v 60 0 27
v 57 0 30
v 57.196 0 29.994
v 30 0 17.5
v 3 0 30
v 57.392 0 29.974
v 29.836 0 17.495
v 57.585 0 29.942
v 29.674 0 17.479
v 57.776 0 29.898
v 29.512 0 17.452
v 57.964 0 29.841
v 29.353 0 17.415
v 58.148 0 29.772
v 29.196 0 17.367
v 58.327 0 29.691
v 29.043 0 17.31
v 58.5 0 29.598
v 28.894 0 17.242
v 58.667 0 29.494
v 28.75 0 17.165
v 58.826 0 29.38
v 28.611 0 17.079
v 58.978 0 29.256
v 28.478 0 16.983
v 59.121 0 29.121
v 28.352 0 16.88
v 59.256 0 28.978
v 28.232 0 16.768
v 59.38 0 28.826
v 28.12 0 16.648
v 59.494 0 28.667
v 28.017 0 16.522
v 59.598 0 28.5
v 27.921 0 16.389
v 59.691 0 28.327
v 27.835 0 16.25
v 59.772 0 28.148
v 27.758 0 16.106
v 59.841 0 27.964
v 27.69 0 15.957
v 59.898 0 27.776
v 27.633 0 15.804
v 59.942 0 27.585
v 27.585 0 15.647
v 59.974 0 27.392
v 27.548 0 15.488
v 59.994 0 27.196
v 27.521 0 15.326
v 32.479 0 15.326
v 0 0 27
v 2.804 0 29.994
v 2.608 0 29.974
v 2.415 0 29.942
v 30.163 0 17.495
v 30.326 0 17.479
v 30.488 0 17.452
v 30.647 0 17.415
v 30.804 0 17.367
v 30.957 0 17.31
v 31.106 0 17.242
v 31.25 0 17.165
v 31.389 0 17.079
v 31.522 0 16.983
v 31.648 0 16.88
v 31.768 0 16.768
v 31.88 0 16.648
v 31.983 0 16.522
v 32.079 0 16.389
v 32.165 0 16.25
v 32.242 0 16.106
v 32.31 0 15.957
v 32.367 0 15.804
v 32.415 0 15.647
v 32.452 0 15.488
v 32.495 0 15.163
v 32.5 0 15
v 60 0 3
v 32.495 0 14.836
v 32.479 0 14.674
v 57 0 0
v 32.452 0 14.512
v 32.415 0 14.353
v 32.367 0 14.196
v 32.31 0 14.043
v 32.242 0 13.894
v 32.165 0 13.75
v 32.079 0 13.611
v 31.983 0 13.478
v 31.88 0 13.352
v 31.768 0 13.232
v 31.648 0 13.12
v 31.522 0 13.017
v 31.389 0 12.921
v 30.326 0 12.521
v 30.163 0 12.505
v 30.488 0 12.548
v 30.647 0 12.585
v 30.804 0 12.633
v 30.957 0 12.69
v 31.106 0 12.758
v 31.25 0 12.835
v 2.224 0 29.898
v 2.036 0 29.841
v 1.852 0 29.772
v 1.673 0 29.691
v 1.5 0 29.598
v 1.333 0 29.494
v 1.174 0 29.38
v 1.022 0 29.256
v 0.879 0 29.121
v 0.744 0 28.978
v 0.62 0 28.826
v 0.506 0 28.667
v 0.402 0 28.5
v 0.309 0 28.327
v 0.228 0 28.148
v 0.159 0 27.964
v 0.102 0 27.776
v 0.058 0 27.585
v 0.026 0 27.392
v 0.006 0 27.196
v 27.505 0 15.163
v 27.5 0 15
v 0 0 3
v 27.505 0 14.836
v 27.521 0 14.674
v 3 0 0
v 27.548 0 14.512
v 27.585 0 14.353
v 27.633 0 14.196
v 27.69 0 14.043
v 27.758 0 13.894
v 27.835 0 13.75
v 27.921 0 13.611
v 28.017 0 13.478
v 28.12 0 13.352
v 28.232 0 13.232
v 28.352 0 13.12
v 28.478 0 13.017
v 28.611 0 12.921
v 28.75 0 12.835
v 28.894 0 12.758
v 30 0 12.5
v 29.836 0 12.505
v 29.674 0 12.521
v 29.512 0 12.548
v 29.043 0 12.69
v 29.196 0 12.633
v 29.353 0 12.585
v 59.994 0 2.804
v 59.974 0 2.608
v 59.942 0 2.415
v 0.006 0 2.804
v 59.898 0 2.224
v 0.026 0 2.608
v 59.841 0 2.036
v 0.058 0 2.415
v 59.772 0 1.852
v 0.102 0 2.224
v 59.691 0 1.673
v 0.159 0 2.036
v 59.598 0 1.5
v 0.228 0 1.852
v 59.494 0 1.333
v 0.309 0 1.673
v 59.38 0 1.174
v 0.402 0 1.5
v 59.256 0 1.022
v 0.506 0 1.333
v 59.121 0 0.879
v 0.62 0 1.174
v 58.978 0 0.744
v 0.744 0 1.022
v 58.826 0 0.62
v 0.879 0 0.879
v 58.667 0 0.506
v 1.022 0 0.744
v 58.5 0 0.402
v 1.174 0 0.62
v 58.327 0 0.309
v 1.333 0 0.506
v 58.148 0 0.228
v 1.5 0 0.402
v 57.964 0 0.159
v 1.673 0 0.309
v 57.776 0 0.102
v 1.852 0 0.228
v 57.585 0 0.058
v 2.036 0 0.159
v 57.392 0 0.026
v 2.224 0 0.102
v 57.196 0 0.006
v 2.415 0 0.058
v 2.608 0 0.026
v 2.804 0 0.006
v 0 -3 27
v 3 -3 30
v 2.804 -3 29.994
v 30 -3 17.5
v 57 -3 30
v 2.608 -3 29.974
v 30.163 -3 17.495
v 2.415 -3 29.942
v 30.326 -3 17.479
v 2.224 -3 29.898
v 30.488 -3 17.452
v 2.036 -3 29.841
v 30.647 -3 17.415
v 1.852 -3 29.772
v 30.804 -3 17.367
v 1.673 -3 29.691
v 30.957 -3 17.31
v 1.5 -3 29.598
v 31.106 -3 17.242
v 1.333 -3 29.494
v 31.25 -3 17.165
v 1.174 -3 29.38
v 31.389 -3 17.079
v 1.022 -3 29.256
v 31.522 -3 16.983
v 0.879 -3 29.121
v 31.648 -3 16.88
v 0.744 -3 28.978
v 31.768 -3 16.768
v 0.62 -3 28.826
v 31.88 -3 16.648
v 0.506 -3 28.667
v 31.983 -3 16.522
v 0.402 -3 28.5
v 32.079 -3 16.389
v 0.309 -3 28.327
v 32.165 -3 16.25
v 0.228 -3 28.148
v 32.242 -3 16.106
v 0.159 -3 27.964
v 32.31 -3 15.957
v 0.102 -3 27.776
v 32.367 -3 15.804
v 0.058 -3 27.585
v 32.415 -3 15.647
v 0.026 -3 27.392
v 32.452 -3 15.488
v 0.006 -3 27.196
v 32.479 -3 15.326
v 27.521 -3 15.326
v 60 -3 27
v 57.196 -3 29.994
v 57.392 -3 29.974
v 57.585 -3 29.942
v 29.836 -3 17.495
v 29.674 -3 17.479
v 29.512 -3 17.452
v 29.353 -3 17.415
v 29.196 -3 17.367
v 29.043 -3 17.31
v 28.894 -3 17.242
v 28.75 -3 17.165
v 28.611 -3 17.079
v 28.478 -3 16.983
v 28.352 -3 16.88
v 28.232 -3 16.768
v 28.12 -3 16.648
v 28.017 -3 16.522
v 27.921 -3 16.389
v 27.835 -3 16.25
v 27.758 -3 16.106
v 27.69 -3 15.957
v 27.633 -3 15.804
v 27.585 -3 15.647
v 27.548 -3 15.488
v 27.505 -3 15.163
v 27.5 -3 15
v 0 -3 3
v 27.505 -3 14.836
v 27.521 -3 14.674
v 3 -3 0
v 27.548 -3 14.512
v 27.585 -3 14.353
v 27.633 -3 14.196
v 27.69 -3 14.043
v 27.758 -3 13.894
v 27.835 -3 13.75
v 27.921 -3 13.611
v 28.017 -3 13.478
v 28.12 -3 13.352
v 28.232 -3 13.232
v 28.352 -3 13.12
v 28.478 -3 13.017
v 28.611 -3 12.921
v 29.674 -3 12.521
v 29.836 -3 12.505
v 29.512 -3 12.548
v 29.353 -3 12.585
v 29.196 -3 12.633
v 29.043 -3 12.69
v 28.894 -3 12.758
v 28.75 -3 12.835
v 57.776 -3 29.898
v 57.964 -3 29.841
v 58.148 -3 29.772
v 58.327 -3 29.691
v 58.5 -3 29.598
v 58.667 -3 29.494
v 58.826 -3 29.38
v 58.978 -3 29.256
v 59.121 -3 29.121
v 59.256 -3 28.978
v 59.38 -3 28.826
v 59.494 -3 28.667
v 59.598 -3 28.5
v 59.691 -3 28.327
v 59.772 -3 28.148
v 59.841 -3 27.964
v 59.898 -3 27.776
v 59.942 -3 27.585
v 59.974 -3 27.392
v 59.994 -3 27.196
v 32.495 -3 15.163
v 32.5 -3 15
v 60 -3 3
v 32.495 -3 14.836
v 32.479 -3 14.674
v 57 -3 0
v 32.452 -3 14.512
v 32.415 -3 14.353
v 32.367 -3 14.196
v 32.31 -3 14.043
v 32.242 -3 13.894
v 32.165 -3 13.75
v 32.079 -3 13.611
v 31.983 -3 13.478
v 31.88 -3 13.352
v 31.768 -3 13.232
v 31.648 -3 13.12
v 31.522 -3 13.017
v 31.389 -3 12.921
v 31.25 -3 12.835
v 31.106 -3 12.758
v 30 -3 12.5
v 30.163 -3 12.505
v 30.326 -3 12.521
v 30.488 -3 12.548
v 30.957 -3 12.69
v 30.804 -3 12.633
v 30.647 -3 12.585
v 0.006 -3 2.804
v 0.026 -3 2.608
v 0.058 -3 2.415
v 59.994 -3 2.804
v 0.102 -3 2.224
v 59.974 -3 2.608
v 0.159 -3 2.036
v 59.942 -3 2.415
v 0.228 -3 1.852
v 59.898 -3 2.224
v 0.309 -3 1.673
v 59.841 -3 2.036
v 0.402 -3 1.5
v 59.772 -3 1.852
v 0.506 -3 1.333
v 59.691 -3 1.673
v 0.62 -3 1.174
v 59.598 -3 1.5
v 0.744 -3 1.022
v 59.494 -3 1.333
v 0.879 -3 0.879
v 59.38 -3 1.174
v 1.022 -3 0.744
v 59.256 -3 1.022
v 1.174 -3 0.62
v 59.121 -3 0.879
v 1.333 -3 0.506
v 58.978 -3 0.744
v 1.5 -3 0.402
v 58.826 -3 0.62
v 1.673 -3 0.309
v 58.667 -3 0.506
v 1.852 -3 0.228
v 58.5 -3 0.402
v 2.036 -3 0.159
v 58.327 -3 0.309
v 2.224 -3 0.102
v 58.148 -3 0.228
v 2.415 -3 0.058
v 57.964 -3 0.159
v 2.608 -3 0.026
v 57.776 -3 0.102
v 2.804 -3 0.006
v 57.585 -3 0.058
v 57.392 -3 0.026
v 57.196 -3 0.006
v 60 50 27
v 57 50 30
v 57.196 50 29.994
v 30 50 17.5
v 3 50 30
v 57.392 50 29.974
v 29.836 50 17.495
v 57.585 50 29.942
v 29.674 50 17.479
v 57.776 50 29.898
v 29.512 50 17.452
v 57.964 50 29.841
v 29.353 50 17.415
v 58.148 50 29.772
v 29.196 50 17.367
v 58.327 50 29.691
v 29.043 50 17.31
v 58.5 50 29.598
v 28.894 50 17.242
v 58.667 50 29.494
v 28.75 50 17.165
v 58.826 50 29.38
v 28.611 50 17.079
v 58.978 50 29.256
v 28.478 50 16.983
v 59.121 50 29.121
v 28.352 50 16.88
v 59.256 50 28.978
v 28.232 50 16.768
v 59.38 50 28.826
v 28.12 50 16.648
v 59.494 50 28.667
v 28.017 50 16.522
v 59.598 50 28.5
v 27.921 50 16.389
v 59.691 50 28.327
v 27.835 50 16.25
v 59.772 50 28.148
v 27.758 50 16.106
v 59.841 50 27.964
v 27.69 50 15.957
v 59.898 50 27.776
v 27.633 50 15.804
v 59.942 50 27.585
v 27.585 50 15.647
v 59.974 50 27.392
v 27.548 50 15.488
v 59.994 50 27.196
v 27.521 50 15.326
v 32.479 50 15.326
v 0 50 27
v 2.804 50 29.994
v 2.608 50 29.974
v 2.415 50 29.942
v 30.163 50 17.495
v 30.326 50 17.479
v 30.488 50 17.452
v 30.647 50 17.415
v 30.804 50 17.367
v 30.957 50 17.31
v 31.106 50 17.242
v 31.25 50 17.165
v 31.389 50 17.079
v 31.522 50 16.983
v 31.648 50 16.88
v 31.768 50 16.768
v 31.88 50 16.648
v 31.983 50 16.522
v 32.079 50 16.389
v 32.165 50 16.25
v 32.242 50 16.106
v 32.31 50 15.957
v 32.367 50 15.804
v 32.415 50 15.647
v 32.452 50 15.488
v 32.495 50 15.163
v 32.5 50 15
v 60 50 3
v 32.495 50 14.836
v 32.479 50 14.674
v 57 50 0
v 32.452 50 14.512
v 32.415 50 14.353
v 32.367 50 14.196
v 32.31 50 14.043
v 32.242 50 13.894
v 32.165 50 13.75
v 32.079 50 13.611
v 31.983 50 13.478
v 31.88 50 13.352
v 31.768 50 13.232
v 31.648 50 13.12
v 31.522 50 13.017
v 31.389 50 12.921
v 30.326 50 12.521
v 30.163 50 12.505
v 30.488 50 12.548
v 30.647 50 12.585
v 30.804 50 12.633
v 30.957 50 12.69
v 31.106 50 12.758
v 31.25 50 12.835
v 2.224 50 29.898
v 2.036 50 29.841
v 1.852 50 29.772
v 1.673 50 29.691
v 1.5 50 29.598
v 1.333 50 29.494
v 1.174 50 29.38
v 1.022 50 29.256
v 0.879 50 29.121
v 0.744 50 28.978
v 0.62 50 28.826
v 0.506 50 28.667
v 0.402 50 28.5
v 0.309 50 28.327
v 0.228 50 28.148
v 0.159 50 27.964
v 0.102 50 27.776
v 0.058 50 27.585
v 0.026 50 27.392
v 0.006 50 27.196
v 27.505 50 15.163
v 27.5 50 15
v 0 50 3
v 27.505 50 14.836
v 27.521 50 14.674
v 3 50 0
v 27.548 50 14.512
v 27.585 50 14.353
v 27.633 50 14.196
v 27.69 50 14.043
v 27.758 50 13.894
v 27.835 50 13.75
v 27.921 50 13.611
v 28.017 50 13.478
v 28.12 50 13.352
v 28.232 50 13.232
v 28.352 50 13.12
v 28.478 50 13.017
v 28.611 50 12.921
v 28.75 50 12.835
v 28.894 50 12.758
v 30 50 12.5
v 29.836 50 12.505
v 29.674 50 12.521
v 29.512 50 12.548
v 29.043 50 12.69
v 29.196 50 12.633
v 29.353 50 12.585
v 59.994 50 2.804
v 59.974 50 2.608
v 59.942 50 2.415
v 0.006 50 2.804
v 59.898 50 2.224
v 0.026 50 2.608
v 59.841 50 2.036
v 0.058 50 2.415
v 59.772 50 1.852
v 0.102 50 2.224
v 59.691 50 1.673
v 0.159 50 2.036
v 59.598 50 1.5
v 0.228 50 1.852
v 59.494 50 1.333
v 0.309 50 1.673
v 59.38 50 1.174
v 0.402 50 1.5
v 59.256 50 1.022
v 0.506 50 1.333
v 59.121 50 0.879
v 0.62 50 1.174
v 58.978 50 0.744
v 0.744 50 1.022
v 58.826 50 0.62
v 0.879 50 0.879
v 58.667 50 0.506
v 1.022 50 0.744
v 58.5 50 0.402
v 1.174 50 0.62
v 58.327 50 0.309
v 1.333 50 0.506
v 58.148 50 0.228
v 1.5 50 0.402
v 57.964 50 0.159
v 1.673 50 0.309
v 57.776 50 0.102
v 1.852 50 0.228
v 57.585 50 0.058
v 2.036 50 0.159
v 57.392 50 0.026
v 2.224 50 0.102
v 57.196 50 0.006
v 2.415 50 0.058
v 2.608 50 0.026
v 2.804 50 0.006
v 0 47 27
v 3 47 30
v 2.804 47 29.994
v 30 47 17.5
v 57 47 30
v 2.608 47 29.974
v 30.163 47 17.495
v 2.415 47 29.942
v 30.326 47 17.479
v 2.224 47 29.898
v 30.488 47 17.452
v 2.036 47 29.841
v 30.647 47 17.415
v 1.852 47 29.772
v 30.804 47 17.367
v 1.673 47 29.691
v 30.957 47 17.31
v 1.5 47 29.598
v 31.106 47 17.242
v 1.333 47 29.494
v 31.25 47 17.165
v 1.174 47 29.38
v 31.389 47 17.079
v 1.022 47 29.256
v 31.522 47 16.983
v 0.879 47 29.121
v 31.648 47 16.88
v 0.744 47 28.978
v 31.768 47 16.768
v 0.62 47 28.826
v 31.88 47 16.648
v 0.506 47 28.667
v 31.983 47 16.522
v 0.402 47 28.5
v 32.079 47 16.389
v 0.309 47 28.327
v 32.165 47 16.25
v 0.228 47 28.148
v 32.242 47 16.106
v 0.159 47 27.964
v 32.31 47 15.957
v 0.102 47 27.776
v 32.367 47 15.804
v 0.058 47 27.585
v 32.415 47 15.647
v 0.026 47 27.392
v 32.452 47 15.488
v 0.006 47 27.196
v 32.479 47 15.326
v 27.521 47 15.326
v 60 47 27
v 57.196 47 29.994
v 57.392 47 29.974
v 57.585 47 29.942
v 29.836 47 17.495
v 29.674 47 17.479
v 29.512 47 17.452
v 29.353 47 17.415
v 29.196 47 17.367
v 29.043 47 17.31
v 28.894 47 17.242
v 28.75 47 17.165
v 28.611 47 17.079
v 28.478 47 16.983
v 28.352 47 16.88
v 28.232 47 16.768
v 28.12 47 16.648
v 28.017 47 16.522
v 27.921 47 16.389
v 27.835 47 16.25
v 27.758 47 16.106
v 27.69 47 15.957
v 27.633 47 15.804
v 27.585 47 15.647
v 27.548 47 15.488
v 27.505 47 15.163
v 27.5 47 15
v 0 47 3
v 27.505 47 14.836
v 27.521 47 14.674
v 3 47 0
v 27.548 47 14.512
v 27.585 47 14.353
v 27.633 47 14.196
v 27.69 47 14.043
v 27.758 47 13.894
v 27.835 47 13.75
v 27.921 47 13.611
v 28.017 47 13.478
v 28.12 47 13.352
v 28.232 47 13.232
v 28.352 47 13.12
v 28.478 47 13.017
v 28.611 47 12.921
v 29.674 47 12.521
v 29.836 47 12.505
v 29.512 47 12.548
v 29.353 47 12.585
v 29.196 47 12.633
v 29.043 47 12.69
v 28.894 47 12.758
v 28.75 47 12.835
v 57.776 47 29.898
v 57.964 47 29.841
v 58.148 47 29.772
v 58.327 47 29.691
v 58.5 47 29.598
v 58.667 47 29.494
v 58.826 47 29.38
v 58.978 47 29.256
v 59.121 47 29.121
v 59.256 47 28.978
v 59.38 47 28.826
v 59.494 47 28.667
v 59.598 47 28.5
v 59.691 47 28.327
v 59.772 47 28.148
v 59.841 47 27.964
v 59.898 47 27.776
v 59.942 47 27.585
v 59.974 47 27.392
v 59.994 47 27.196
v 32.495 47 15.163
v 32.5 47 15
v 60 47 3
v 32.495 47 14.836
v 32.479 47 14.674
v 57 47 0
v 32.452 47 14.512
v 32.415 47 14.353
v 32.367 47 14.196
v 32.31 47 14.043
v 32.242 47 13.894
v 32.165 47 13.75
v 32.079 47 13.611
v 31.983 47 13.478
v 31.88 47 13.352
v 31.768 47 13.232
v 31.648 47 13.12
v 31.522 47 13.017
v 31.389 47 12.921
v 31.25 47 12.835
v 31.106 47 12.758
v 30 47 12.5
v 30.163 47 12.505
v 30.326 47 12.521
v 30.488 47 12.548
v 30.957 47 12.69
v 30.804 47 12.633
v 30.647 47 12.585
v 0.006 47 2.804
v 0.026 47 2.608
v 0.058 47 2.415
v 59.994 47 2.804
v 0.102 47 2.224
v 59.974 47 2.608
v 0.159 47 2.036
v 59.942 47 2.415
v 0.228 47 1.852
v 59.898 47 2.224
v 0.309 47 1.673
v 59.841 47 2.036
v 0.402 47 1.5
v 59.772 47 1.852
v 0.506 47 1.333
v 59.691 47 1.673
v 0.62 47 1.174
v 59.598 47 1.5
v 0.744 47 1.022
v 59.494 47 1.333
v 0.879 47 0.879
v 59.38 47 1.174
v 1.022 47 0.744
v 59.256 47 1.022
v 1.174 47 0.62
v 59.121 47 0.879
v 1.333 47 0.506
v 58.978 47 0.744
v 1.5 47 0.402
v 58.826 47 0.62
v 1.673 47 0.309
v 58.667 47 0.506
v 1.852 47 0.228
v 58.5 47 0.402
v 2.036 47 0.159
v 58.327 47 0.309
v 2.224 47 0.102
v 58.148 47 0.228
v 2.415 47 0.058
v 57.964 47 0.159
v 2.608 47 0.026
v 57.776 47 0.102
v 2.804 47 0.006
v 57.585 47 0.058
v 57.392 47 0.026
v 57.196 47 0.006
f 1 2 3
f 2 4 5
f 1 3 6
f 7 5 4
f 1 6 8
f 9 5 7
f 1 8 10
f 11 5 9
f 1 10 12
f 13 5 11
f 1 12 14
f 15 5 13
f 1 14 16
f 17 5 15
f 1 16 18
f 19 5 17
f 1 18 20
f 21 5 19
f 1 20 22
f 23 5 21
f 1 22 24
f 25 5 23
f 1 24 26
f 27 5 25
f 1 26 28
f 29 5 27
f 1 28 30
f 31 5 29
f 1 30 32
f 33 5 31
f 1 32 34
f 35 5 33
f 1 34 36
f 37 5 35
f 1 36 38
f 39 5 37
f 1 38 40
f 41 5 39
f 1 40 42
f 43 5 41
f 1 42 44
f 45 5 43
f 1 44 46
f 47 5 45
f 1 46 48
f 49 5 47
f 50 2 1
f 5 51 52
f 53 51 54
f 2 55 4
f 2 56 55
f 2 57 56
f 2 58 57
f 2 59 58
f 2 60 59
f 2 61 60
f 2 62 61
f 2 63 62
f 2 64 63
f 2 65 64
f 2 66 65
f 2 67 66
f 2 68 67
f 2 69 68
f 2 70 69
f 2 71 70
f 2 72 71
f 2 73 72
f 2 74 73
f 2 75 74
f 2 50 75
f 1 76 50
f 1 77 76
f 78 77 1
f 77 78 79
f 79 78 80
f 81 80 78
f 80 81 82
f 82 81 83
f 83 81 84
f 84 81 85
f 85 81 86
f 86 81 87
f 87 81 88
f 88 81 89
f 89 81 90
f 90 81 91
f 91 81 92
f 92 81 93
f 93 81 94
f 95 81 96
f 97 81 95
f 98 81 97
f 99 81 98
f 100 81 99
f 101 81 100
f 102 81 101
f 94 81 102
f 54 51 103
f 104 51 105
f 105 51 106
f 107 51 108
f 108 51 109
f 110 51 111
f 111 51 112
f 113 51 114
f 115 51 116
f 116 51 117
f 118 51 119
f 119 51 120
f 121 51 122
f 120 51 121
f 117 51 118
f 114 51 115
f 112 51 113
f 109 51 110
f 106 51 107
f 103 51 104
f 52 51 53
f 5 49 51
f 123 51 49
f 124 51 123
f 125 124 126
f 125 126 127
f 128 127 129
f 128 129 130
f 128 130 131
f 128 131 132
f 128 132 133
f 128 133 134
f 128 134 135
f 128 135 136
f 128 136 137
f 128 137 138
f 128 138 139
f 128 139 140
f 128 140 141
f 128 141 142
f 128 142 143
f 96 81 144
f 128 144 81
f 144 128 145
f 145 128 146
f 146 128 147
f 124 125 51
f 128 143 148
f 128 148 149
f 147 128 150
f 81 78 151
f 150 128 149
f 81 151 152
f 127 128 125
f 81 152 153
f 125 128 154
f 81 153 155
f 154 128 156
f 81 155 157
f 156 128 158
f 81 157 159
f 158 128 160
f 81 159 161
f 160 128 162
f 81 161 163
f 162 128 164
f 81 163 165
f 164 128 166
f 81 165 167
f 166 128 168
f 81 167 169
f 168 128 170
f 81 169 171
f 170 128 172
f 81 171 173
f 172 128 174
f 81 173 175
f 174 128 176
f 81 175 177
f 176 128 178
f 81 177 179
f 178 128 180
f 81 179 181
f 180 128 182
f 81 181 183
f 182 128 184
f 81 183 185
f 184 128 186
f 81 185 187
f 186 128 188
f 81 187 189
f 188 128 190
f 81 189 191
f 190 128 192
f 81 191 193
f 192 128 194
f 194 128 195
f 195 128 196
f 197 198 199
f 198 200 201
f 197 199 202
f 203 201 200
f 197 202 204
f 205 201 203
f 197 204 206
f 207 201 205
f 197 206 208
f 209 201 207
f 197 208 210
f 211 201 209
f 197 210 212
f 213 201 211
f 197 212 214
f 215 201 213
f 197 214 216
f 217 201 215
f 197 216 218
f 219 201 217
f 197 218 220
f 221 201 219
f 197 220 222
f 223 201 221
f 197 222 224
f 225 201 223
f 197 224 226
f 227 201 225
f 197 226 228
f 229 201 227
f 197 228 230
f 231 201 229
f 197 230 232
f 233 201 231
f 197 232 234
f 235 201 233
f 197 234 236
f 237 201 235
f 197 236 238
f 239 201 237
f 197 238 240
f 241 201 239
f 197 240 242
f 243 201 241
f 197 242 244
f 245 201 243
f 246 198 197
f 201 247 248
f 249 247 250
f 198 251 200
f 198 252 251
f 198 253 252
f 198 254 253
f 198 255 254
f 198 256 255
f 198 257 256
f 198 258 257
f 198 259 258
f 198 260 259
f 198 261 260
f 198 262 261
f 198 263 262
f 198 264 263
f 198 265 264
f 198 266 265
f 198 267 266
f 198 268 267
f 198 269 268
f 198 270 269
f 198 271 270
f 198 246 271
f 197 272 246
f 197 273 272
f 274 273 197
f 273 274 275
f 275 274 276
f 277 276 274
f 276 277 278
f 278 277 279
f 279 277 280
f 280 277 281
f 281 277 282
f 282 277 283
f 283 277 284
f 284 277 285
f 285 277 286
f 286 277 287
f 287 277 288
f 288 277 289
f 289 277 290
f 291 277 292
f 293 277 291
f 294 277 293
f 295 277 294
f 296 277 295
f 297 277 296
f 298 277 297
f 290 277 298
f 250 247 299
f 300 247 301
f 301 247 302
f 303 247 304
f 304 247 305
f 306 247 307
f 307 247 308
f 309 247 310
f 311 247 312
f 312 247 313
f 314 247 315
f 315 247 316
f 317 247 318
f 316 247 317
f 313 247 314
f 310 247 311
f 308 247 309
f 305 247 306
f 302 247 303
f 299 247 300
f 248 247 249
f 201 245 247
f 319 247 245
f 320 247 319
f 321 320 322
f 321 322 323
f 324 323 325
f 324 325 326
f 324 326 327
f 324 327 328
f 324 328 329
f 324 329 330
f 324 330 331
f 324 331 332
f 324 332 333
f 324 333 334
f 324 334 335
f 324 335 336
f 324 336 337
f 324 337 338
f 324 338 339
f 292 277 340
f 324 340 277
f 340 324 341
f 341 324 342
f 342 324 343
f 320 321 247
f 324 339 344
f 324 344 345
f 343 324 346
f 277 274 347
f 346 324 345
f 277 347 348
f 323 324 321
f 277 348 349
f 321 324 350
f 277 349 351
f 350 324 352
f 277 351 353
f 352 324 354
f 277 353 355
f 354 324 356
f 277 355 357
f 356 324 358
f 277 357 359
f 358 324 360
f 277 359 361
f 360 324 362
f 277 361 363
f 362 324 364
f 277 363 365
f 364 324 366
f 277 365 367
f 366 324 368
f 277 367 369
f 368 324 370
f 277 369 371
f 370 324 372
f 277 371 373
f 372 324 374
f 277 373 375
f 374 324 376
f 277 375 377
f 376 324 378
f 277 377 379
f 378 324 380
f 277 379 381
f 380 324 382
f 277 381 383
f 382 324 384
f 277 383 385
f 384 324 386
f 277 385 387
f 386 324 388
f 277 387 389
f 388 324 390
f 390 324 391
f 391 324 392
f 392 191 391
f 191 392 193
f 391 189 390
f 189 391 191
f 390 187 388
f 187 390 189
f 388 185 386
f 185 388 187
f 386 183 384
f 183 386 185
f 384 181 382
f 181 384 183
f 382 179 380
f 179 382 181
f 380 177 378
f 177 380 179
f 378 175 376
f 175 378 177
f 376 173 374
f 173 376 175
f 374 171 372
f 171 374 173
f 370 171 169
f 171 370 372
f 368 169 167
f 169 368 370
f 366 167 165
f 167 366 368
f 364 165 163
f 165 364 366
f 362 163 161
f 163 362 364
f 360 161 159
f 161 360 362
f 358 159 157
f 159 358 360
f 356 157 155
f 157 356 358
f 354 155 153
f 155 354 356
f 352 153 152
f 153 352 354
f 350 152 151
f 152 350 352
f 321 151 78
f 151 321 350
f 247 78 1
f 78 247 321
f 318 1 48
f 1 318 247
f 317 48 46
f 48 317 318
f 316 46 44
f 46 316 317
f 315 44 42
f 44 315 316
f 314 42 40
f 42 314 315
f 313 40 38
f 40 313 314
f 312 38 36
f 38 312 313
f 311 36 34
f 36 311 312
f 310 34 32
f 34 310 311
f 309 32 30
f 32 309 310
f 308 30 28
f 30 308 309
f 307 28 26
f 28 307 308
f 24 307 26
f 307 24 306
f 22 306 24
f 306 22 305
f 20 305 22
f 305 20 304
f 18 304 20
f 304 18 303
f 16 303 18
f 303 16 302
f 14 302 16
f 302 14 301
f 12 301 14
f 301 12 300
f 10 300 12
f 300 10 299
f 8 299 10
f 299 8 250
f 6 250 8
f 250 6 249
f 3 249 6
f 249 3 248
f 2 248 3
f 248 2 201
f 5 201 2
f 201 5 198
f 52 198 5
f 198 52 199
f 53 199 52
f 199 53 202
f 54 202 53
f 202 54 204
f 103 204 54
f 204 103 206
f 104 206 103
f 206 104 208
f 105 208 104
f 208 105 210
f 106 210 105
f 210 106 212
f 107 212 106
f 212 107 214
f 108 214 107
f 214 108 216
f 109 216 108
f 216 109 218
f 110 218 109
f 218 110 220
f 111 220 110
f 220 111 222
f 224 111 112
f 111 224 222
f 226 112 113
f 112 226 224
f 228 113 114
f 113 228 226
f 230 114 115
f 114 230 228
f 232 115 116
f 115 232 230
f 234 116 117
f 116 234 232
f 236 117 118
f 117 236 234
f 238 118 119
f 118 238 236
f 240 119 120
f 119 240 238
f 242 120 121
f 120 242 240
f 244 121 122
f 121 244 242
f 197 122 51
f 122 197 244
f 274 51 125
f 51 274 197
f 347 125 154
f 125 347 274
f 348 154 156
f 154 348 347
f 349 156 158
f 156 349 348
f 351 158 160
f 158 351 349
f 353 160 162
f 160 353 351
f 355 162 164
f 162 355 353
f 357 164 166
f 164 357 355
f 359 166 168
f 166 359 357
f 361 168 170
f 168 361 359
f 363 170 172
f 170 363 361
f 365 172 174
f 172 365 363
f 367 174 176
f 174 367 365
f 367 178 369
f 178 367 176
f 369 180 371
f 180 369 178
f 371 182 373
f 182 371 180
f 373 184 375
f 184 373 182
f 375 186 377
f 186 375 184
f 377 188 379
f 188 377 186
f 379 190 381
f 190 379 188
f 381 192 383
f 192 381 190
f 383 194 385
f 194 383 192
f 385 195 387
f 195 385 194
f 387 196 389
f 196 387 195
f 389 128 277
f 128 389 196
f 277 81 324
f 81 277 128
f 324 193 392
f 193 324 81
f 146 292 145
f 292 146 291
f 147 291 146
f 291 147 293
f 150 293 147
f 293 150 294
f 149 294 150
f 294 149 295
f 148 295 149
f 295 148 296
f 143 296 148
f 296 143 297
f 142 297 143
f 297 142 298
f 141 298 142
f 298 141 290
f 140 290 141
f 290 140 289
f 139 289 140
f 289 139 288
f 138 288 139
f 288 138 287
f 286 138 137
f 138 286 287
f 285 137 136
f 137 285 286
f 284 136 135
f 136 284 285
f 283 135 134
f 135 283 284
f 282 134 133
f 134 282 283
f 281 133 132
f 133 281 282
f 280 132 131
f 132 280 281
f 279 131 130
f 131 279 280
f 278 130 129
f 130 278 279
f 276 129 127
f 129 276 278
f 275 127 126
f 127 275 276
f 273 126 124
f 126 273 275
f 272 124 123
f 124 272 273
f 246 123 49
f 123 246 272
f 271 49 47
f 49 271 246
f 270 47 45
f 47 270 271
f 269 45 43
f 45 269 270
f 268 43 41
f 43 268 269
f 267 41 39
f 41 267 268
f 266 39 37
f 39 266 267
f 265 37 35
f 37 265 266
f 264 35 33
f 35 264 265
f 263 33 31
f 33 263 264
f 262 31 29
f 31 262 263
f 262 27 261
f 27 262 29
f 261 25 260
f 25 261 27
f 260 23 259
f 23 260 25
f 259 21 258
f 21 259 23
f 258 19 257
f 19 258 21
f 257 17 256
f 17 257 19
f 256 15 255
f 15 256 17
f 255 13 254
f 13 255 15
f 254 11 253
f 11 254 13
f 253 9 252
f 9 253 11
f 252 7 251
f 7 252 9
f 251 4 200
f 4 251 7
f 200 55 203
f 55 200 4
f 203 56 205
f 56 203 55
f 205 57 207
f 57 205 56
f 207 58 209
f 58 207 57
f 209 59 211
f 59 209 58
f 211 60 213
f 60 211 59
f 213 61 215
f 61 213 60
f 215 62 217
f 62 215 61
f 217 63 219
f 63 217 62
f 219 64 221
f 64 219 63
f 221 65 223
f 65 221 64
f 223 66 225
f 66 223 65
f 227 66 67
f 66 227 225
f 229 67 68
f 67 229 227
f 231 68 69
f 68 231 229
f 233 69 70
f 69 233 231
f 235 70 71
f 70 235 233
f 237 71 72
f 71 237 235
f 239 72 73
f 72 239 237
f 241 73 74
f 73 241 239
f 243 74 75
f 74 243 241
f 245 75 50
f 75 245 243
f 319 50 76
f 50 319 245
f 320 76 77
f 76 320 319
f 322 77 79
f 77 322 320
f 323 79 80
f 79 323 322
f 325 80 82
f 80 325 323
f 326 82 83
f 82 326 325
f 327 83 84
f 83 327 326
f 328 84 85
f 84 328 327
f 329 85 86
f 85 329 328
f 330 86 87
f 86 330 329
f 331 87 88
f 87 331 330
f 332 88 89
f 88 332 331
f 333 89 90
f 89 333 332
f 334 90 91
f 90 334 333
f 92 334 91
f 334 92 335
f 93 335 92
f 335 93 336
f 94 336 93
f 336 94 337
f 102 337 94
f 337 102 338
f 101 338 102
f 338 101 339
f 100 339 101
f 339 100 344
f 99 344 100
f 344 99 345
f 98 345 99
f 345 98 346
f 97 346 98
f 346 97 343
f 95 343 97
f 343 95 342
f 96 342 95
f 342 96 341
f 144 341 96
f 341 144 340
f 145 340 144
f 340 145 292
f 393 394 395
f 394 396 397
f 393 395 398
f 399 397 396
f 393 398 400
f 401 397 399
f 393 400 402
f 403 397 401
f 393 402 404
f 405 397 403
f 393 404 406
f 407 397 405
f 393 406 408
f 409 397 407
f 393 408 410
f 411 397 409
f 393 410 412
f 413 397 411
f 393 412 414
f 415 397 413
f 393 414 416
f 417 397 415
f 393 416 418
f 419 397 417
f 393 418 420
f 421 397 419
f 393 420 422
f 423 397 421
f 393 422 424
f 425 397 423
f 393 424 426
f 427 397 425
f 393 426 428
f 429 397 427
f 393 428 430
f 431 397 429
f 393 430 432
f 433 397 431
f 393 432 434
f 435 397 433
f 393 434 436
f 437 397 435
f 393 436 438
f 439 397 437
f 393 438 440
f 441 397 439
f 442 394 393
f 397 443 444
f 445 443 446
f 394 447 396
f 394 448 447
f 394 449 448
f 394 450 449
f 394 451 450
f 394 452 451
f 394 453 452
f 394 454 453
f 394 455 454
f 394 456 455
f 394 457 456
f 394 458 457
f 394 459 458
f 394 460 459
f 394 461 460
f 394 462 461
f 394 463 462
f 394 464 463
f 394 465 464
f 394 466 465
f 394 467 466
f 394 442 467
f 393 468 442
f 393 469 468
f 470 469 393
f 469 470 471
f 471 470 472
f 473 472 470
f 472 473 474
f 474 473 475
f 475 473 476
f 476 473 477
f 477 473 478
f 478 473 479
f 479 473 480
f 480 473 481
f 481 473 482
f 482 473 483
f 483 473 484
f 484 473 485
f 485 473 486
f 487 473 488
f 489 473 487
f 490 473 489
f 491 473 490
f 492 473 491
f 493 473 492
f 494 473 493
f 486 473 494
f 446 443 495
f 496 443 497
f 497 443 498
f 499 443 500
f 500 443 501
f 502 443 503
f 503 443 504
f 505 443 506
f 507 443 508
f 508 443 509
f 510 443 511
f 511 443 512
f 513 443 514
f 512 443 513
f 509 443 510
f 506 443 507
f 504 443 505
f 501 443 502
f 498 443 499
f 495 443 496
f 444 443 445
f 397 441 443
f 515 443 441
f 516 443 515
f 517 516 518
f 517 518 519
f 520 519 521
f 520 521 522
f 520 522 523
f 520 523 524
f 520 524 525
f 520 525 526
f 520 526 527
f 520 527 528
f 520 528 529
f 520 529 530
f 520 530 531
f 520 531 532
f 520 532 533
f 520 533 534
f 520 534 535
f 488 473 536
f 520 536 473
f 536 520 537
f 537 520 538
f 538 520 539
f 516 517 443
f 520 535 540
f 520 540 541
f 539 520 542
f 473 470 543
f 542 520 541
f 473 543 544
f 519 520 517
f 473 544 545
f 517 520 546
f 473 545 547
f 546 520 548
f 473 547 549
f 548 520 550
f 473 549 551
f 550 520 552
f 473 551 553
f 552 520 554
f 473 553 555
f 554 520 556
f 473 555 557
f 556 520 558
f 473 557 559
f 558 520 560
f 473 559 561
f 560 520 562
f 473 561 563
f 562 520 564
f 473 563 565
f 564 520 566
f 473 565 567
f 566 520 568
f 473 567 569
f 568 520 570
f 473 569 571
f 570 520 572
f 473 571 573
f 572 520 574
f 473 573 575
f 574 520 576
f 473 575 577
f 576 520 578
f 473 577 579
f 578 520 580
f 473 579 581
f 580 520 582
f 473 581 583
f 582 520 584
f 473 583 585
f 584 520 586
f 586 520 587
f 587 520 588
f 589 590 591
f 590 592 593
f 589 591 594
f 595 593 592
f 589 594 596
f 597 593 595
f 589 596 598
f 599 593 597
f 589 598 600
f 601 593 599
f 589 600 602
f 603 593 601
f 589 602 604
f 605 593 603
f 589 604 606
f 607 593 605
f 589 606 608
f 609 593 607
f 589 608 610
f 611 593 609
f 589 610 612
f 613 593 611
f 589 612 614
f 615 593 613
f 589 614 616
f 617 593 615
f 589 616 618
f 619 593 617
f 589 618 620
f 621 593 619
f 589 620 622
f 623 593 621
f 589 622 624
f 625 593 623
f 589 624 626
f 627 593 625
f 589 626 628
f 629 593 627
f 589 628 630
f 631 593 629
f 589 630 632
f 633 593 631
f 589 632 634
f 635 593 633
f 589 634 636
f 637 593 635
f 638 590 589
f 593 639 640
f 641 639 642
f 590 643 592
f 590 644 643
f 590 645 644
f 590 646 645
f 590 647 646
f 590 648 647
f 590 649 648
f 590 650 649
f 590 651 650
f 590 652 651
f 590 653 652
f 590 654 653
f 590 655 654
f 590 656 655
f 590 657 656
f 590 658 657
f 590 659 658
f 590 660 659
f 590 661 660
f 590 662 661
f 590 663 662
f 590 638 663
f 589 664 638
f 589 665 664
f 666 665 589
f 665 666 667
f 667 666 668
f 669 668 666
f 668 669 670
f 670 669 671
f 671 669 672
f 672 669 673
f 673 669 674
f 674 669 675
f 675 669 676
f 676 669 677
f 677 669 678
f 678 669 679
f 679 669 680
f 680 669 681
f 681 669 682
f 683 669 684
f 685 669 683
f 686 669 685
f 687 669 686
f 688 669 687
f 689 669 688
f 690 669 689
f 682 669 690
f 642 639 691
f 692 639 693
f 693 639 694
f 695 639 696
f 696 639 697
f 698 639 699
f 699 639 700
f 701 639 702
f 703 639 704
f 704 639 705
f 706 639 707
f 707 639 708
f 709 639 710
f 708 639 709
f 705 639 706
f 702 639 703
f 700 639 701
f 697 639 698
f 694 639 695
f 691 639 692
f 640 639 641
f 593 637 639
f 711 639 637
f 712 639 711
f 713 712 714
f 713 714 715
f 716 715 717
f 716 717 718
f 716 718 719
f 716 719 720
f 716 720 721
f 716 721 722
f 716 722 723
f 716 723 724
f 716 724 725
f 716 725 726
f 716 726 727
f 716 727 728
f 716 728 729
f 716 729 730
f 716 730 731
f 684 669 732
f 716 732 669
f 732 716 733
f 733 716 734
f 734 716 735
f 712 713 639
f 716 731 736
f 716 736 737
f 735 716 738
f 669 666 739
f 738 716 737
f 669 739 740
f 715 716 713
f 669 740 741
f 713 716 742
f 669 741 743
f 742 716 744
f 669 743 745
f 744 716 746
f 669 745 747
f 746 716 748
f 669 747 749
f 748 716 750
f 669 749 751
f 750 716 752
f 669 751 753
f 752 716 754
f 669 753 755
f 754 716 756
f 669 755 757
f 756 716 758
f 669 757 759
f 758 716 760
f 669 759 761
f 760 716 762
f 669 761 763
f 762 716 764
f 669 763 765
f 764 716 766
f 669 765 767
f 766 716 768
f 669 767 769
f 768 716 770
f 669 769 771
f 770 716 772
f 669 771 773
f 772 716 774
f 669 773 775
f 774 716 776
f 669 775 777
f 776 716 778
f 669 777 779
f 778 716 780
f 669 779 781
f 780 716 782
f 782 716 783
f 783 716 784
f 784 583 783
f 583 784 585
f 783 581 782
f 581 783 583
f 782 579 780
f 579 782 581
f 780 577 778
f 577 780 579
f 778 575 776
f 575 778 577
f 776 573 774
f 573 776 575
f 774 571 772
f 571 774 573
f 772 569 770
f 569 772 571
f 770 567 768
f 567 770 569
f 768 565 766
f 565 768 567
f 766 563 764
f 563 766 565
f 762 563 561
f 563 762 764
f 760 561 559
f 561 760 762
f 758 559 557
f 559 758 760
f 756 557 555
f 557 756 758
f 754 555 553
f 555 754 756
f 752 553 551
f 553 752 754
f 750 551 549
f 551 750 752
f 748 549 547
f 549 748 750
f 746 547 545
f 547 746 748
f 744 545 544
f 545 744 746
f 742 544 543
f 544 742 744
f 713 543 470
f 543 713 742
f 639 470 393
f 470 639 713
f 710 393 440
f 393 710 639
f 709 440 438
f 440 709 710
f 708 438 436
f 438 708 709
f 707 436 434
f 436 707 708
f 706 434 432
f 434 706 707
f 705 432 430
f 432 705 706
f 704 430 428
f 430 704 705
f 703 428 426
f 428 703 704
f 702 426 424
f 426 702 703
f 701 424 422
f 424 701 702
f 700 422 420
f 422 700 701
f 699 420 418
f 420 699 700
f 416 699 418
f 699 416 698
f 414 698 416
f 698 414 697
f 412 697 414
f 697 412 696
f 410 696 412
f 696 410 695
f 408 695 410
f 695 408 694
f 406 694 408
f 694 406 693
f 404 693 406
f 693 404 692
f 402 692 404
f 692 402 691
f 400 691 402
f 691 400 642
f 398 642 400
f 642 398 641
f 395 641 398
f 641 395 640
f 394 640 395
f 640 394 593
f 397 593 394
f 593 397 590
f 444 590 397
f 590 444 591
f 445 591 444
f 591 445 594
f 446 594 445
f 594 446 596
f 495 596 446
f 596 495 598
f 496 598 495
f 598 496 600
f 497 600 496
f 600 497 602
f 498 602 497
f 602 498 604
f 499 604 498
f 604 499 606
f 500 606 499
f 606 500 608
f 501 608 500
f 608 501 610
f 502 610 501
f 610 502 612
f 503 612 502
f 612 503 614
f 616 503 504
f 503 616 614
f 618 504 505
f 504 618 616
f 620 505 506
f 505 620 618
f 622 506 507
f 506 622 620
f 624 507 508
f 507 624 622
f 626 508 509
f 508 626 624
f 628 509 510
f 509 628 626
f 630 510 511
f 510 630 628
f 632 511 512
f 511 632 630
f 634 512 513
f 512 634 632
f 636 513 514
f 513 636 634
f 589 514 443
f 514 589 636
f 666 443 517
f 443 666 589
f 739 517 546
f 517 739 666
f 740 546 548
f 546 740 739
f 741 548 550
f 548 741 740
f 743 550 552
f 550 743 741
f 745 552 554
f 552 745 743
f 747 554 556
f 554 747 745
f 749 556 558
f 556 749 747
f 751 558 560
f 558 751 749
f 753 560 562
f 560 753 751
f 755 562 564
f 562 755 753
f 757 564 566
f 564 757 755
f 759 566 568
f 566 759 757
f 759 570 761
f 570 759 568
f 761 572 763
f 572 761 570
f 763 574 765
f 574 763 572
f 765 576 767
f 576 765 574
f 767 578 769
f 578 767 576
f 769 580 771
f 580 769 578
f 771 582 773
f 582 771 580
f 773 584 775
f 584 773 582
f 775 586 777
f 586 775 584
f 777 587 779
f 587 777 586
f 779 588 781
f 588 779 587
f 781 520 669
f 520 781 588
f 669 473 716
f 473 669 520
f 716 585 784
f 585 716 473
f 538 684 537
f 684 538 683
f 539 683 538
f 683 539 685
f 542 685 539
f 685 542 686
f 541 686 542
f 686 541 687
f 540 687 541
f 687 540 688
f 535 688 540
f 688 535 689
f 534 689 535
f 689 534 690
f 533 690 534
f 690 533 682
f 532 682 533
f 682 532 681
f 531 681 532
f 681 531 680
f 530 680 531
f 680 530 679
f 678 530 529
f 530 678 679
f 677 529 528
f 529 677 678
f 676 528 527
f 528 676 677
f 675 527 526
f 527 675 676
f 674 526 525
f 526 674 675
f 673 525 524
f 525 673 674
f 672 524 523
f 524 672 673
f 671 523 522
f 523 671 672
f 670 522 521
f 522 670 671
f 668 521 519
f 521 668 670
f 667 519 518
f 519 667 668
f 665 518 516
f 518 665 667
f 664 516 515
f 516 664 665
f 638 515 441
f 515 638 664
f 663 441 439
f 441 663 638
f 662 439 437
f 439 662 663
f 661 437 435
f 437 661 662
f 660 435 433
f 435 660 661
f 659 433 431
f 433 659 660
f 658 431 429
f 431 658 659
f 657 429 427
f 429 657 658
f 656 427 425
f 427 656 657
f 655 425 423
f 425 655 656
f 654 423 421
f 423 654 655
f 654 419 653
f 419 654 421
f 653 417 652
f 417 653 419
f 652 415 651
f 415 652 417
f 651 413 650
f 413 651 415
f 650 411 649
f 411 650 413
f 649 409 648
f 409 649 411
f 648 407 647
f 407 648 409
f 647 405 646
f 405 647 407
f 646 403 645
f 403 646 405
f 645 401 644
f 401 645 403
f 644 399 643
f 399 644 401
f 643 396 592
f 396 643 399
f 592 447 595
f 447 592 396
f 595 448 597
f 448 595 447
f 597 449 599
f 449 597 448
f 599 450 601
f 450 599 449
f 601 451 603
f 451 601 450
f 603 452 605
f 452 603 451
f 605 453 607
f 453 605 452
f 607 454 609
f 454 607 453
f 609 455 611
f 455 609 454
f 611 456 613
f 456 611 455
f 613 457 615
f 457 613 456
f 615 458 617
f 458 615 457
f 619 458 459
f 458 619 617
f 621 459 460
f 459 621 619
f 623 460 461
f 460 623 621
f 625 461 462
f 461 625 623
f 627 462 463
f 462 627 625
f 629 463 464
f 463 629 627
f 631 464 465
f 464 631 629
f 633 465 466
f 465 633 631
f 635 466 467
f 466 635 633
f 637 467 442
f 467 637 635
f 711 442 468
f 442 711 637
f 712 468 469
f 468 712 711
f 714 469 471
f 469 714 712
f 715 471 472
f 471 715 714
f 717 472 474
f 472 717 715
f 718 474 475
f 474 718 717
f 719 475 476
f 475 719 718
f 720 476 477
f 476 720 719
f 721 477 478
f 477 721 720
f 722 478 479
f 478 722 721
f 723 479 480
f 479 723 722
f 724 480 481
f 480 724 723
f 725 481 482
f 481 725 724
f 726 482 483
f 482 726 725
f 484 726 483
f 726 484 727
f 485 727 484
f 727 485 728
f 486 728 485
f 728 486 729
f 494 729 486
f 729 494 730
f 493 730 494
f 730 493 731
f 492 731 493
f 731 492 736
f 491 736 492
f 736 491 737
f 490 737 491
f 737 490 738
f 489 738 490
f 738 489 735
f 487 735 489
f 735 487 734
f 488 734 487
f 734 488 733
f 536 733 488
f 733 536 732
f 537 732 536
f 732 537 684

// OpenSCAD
// file: ../component/component_2d.scad
// Canonical manufacturing profile for the component template.
module tpl_component_plate_2d(size=[60, 30], hole_diameter=5,
                              corner_radius=3)
{
    assert(size[0] > 2*corner_radius && size[1] > 2*corner_radius,
           "tpl_component_plate_2d: radius consumes the plate");
    assert(hole_diameter > 0 && hole_diameter < min(size),
           "tpl_component_plate_2d: invalid hole diameter");

    difference() {
        translate([corner_radius, corner_radius])
            offset(r=corner_radius)
                square([size[0]-2*corner_radius,
                        size[1]-2*corner_radius]);
        translate(size/2)
            circle(d=hole_diameter);
    }
}
// file: ../../cutter_lib/layout/cl_cut_layout.scad
// Deterministic sheet-layout helpers. Placement remains explicit because
// OpenSCAD cannot query arbitrary child bounds reliably.

/* [Output] */
make_3d = true; // [false:true]

/* [2D Layout] */
example_sheet_size = [120, 70];
example_margin = 5;
example_spacing = 5;

/* [Example] */
example_part_size = [45, 25];
example_thickness = 3;

/* [Hidden] */

cl_cut_layout_example(
    sheet_size=example_sheet_size,
    margin=example_margin,
    spacing=example_spacing,
    part_size=example_part_size,
    thickness=example_thickness,
    make_3d=make_3d);

module cl_cut_layout_example(sheet_size=[120, 70], margin=5, spacing=5,
                             part_size=[45, 25], thickness=3,
                             make_3d=false)
{
    positions = [[margin, margin],
                 [margin+part_size[0]+spacing, margin]];
    boxes = [[positions[0][0], positions[0][1],
              part_size[0], part_size[1]],
             [positions[1][0], positions[1][1],
              part_size[0], part_size[1]]];
    cl_validate_layout(boxes, sheet_size, margin, spacing, "example sheet");

    if (!make_3d)
        cl_sheet_boundary(sheet_size, "LAYOUT EXAMPLE");

    for (p = positions)
        translate([p[0], p[1], 0])
            if (make_3d)
                linear_extrude(height=thickness)
                    square(part_size);
            else
                square(part_size);
}

function cl_boxes_overlap(a, b, spacing=0) =
    !(a[0]+a[2]+spacing <= b[0] ||
      b[0]+b[2]+spacing <= a[0] ||
      a[1]+a[3]+spacing <= b[1] ||
      b[1]+b[3]+spacing <= a[1]);

module cl_validate_layout(boxes, sheet_size=[300,300],
                          margin=5, spacing=3, name="sheet")
{
    assert(sheet_size[0] > 2*margin && sheet_size[1] > 2*margin,
           str("cl_validate_layout: invalid ", name, " dimensions/margin"));

    for (i = [0:len(boxes)-1]) {
        b = boxes[i];
        assert(b[0] >= margin && b[1] >= margin &&
               b[0]+b[2] <= sheet_size[0]-margin &&
               b[1]+b[3] <= sheet_size[1]-margin,
               str("cl_validate_layout: part ", i,
                   " is outside ", name));

        if (i < len(boxes)-1)
            for (j = [i+1:len(boxes)-1])
                assert(!cl_boxes_overlap(b, boxes[j], spacing),
                       str("cl_validate_layout: parts ", i,
                           " and ", j, " overlap on ", name));
    }
}

module cl_sheet_boundary(sheet_size=[300,300], label="",
                         line_width=0.3)
{
    assert(sheet_size[0] > 0 && sheet_size[1] > 0,
           "cl_sheet_boundary: sheet size must be positive");

    %difference() {
        square(sheet_size);
        translate([line_width, line_width])
            square([sheet_size[0]-2*line_width,
                    sheet_size[1]-2*line_width]);
    }

    if (label != "")
        %translate([2, sheet_size[1]-5])
            text(label, size=3);
}

// Place a known-size part and optionally add a preview-only identifier.
module cl_layout_part(position, size, id="", quantity=1,
                      sheet_size=[300,300], margin=5,
                      label_size=2)
{
    assert(size[0] > 0 && size[1] > 0,
           str("cl_layout_part: ", id, " has non-positive size"));
    assert(position[0] >= margin && position[1] >= margin &&
           position[0]+size[0] <= sheet_size[0]-margin &&
           position[1]+size[1] <= sheet_size[1]-margin,
           str("cl_layout_part: ", id, " does not fit the sheet"));

    translate(position)
        children();

    if (id != "")
        %translate([position[0],
                    max(0.5, position[1]-label_size-0.5)])
            text(str(id, quantity > 1 ? str(" x", quantity) : ""),
                 size=label_size);
}

// Preview conventions for separating operations. Geometry is not altered.
module cl_cut_geometry()
{
    color("red")
        children();
}

module cl_engrave_geometry()
{
    color("blue")
        children();
}

module cl_reference_geometry()
{
    %color("gray")
        children();
}

// Select a manufacturing operation explicitly. Preview mode keeps both
// operations visible with conventional colours; exported cut/engrave modes
// contain only the requested geometry.
module cl_operation_geometry(kind="cut", output="preview")
{
    assert(kind == "cut" || kind == "engrave",
           "cl_operation_geometry: kind must be cut or engrave");
    assert(output == "cut" || output == "engrave" ||
           output == "preview",
           "cl_operation_geometry: unsupported output");

    if (output == kind)
        children();
    else if (output == "preview") {
        if (kind == "cut")
            cl_cut_geometry()
                children();
        else
            cl_engrave_geometry()
                children();
    }
}
// file: ../component/component.scad
use <component_2d.scad>

/* [Output] */
make_3d = true; // [false:true]

/* [Dimensions] */
plate_size = [60, 30];
material_thickness = 3; // [0.5:0.5:12]
hole_diameter = 5;      // [1:0.5:20]
corner_radius = 3;      // [0:0.5:12]

/* [Example] */
example_color = "burlywood";

/* [Hidden] */
$fn = $preview ? 32 : 96;

tpl_component_plate(
    size=plate_size,
    thickness=material_thickness,
    hole_diameter=hole_diameter,
    corner_radius=corner_radius,
    make_3d=make_3d,
    part_color=example_color
);

// Public wrapper. The 3D branch only extrudes the canonical 2D profile.
module tpl_component_plate(size=[60, 30], thickness=3,
                           hole_diameter=5, corner_radius=3,
                           make_3d=false, part_color="burlywood")
{
    assert(thickness > 0,
           "tpl_component_plate: thickness must be positive");

    color(part_color)
        if (make_3d)
            linear_extrude(height=thickness)
                tpl_component_plate_2d(
                    size=size,
                    hole_diameter=hole_diameter,
                    corner_radius=corner_radius);
        else
            tpl_component_plate_2d(
                size=size,
                hole_diameter=hole_diameter,
                corner_radius=corner_radius);
}
// file: assembly_layout.scad
use <../../cutter_lib/layout/cl_cut_layout.scad>
use <../component/component.scad>

/* [Output] */
make_3d = false; // [false:true]

/* [2D Layout] */
sheet_size = [300, 200];
sheet_margin = 5; // [0:1:20]
part_spacing = 5; // [0:1:20]
layout_operation = "cut"; // [cut,engrave,score,reference,all]

/* [Example] */
material_thickness = 3; // [1:0.5:8]

/* [Hidden] */

tpl_assembly_layout(
    sheet_size=sheet_size,
    margin=sheet_margin,
    spacing=part_spacing,
    thickness=material_thickness,
    operation=layout_operation,
    make_3d=make_3d);

module tpl_assembly_layout(sheet_size=[300, 200], margin=5, spacing=5,
                           thickness=3, operation="cut", make_3d=false)
{
    part_size = [60, 30];
    positions = [[margin, margin],
                 [margin+part_size[0]+spacing, margin]];
    boxes = [[positions[0][0], positions[0][1], part_size[0], part_size[1]],
             [positions[1][0], positions[1][1], part_size[0], part_size[1]]];

    cl_validate_layout(boxes, sheet_size, margin, spacing,
                       "template assembly sheet");

    if (!make_3d)
        cl_sheet_boundary(sheet_size, "TEMPLATE");

    for (i = [0:1])
        translate([positions[i][0], positions[i][1], 0])
            tpl_component_plate(
                size=part_size,
                thickness=thickness,
                make_3d=make_3d,
                part_color=i == 0 ? "burlywood" : "peru");
}
// file: assembly_config.scad
/* [Output] */
make_3d = true; // [false:true]

/* [Dimensions] */
example_width = 80;             // [40:5:160]
example_depth = 50;             // [30:5:120]
example_height = 45;            // [20:5:100]
example_material_thickness = 3; // [1:0.5:8]

/* [Example] */
show_dimension_blocks = true;

/* [Hidden] */

if (show_dimension_blocks)
    tpl_config_example(
        width=example_width,
        depth=example_depth,
        height=example_height,
        thickness=example_material_thickness,
        make_3d=make_3d);

function tpl_default_size() = [80, 50, 45];
function tpl_default_thickness() = 3;
function tpl_default_sheet_size() = [300, 200];

// A configuration file still supplies a useful standalone scale example.
module tpl_config_example(width=80, depth=50, height=45, thickness=3,
                          make_3d=false)
{
    sizes = [[width, thickness], [depth, thickness], [height, thickness]];
    for (i = [0:2])
        translate([0, i*(thickness+4)])
            if (make_3d)
                linear_extrude(height=thickness)
                    square(sizes[i]);
            else
                square(sizes[i]);
}
// main file
use <assembly_config.scad>
use <assembly_layout.scad>
use <../component/component.scad>

/* [Output] */
make_3d = true; // [false:true]
output_mode = "automatic"; // [automatic,assembly,cut_layout,single_part,calibration,debug]

/* [Dimensions] */
assembly_size = [80, 50, 45];
material_thickness = 3; // [1:0.5:8]

/* [Material] */
kerf = 0.15;         // [0:0.01:1]
fit_clearance = 0.1; // [-0.5:0.05:1]

/* [2D Layout] */
sheet_size = [300, 200];
sheet_margin = 5;
part_spacing = 5;
layout_operation = "cut"; // [cut,engrave,score,reference,all]

/* [Example] */
single_part_id = "TPL-SIDE-A"; // [TPL-SIDE-A,TPL-SIDE-B]

/* [Hidden] */
$fn = $preview ? 32 : 96;
resolved_output_mode = output_mode == "automatic"
    ? (make_3d ? "assembly" : "cut_layout")
    : output_mode;

tpl_assembly_entry(
    output_mode=resolved_output_mode,
    size=assembly_size,
    thickness=material_thickness,
    sheet_size=sheet_size,
    margin=sheet_margin,
    spacing=part_spacing,
    operation=layout_operation,
    single_part_id=single_part_id);

module tpl_assembly_entry(output_mode="assembly", size=[80, 50, 45],
                          thickness=3, sheet_size=[300, 200], margin=5,
                          spacing=5, operation="cut",
                          single_part_id="TPL-SIDE-A")
{
    assert(thickness > 0, "template assembly: thickness must be positive");

    if (output_mode == "assembly")
        tpl_assembly(size=size, thickness=thickness);
    else if (output_mode == "cut_layout")
        tpl_assembly_layout(sheet_size=sheet_size, margin=margin,
                            spacing=spacing, thickness=thickness,
                            operation=operation, make_3d=false);
    else if (output_mode == "single_part")
        tpl_component_plate(thickness=thickness, make_3d=false);
    else if (output_mode == "calibration")
        tpl_component_plate(size=[40, 20], thickness=thickness,
                            hole_diameter=thickness+0.1, make_3d=false);
    else if (output_mode == "debug")
        tpl_assembly(size=size, thickness=thickness);
    else
        assert(false, str("template assembly: unsupported output_mode ",
                          output_mode));
}

module tpl_assembly(size=[80, 50, 45], thickness=3)
{
    plate_size = [60, 30];
    translate([0, 0, 0])
        rotate([90, 0, 0])
            tpl_component_plate(size=plate_size, thickness=thickness,
                                make_3d=true);
    translate([0, size[1], 0])
        rotate([90, 0, 0])
            tpl_component_plate(size=plate_size, thickness=thickness,
                                make_3d=true, part_color="peru");
}
